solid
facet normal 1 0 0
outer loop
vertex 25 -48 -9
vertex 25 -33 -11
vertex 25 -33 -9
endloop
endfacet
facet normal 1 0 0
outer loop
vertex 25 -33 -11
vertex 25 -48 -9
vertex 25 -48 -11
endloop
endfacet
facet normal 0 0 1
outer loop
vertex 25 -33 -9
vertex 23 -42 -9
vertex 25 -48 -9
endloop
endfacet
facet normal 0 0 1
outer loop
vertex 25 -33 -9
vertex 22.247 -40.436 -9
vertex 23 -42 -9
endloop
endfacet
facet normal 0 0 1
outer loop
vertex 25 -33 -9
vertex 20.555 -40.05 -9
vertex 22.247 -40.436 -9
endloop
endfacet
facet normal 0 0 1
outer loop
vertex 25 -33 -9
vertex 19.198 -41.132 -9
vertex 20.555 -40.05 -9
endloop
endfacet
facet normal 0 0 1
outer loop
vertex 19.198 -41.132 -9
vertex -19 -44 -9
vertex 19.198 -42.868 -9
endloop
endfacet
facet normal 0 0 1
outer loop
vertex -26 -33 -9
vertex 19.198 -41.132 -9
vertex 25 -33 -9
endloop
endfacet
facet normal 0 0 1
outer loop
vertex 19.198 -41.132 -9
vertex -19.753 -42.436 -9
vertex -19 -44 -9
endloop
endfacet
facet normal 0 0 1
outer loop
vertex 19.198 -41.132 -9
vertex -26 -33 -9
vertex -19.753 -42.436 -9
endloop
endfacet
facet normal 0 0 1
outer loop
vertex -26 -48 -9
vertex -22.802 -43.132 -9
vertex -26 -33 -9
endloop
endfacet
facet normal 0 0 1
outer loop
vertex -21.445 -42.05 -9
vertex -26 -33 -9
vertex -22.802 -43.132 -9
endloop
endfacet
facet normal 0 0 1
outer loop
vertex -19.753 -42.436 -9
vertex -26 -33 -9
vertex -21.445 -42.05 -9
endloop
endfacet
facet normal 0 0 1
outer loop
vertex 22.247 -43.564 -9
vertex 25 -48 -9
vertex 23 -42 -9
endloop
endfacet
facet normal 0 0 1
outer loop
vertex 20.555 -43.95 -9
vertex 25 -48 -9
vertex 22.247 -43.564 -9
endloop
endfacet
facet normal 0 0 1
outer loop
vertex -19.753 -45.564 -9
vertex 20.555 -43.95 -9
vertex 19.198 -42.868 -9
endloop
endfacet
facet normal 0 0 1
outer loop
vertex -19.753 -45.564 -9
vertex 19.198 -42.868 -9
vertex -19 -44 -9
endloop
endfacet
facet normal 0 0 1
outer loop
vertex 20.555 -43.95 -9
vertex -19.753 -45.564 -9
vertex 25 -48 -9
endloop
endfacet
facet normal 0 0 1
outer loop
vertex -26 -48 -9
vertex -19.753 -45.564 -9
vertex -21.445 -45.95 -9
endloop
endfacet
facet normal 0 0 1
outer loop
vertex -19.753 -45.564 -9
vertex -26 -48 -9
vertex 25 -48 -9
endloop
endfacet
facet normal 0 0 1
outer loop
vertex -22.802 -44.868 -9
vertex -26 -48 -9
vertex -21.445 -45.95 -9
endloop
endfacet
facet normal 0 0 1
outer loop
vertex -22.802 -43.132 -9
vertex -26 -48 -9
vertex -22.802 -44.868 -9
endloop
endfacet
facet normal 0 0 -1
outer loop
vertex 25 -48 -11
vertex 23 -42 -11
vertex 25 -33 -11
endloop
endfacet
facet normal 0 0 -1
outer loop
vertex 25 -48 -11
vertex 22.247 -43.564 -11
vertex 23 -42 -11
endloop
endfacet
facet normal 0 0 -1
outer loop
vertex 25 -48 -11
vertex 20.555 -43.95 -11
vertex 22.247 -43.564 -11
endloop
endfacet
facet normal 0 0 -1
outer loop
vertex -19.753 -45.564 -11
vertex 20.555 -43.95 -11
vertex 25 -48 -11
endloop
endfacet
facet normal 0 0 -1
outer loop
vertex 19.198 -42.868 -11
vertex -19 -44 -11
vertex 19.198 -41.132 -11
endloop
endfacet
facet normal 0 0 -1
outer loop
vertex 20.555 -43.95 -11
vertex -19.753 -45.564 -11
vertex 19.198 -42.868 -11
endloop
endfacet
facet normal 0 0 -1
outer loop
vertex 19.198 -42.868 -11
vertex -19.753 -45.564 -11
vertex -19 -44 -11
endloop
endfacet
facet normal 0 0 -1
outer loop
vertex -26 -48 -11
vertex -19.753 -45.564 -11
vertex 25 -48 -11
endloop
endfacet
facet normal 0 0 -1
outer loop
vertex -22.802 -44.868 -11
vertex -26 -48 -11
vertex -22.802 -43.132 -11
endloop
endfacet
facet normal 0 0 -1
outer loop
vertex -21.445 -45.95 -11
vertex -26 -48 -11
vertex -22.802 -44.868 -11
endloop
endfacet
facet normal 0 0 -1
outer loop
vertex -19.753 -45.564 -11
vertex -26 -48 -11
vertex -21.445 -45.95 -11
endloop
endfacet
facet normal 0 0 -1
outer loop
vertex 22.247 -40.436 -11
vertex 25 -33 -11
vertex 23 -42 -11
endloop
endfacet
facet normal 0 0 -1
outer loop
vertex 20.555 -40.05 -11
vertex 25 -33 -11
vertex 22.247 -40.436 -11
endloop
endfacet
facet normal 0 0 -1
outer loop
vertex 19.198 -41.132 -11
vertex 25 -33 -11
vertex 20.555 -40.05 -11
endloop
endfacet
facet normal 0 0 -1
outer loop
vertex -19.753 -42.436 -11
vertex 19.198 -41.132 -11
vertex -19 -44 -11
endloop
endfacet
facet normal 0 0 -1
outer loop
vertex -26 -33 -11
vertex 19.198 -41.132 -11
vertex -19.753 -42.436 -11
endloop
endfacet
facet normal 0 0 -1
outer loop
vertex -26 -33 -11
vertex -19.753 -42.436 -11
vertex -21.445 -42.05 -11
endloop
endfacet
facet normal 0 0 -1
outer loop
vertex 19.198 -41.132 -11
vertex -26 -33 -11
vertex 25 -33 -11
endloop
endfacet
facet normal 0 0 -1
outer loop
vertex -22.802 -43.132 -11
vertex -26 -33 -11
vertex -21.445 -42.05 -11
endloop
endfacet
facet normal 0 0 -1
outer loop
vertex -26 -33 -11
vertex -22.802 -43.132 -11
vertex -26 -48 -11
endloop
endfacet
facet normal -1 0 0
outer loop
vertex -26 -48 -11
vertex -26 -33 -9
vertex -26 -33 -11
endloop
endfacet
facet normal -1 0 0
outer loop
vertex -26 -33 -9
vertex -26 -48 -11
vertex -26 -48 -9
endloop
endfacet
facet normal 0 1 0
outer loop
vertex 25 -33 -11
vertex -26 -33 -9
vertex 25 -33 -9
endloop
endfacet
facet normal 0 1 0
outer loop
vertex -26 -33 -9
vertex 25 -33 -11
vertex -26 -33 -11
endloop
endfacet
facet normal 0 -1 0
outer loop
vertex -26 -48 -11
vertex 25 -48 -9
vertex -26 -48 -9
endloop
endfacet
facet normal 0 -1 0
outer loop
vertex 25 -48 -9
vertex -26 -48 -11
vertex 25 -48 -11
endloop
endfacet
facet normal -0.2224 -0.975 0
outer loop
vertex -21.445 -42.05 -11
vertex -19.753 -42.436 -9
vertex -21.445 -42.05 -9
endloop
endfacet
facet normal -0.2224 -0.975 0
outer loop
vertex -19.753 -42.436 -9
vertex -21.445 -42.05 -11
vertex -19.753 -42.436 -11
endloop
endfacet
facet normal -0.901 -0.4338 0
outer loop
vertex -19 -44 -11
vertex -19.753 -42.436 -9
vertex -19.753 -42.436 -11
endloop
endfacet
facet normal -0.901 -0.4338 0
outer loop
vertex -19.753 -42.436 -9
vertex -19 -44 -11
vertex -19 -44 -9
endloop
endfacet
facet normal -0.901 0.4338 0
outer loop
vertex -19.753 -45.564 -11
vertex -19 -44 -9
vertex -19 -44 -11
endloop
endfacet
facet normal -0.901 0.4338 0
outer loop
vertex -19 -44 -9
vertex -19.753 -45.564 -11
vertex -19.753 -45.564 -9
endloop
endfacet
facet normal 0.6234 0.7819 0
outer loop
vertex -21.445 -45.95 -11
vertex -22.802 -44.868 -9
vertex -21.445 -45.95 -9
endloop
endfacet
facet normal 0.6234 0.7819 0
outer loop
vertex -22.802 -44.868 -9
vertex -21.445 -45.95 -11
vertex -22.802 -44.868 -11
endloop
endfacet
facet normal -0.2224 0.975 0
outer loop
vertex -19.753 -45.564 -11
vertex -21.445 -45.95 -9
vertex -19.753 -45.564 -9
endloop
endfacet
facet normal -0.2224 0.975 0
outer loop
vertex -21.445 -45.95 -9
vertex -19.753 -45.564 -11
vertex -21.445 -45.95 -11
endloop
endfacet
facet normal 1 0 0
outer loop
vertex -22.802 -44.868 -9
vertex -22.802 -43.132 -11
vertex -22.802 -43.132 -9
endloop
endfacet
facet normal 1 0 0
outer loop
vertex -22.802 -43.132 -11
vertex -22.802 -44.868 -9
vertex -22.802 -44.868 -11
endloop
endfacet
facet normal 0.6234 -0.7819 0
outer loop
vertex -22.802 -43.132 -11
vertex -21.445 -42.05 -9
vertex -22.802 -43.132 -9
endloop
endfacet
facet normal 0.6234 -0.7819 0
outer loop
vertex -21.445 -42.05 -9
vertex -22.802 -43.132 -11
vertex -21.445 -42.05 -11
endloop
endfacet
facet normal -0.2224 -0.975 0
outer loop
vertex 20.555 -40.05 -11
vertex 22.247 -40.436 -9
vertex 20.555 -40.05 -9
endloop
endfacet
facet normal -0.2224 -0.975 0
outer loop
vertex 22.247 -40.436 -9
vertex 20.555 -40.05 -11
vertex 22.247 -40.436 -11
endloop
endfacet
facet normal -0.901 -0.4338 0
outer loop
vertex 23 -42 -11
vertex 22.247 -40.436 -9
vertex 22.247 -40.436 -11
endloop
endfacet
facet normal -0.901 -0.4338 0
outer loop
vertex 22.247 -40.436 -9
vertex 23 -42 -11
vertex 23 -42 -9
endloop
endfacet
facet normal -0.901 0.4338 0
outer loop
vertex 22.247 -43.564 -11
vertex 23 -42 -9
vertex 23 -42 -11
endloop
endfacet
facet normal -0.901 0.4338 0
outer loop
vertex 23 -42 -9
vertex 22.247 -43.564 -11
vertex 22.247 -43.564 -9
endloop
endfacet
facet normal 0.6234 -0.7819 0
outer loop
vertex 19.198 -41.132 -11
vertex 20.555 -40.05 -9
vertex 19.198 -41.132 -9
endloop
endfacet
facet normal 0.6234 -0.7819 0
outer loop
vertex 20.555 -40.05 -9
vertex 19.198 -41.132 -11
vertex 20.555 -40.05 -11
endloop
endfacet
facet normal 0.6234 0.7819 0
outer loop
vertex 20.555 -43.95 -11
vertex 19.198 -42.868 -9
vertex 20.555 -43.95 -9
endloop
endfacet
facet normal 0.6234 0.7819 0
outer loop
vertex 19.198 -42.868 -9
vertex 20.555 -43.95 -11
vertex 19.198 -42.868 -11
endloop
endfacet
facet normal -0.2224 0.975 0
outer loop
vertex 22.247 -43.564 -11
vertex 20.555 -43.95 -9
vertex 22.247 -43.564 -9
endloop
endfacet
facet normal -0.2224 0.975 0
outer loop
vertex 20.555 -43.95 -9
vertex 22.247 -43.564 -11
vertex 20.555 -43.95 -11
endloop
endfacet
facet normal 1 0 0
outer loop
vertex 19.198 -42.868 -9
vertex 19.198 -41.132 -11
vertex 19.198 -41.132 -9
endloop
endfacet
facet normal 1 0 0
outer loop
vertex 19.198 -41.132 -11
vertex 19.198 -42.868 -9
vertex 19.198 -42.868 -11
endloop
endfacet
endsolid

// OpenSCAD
difference ()
{
	translate ([-26,-48,-11]) cube ([51,15,2]);
	translate ([-21,-44,-11]) cylinder (2,2,2);
	translate ([21,-42,-11]) cylinder (2,2,2);
};
//translate ([-27,-49,-11]) cube ([2,2,20]);
//translate ([20,-43,-11]) cube ([2,2,20]);
//translate ([-2,-1.7,-5]) cube ([3.5,3.5,3.5]);
//cylinder (2,2,2);
